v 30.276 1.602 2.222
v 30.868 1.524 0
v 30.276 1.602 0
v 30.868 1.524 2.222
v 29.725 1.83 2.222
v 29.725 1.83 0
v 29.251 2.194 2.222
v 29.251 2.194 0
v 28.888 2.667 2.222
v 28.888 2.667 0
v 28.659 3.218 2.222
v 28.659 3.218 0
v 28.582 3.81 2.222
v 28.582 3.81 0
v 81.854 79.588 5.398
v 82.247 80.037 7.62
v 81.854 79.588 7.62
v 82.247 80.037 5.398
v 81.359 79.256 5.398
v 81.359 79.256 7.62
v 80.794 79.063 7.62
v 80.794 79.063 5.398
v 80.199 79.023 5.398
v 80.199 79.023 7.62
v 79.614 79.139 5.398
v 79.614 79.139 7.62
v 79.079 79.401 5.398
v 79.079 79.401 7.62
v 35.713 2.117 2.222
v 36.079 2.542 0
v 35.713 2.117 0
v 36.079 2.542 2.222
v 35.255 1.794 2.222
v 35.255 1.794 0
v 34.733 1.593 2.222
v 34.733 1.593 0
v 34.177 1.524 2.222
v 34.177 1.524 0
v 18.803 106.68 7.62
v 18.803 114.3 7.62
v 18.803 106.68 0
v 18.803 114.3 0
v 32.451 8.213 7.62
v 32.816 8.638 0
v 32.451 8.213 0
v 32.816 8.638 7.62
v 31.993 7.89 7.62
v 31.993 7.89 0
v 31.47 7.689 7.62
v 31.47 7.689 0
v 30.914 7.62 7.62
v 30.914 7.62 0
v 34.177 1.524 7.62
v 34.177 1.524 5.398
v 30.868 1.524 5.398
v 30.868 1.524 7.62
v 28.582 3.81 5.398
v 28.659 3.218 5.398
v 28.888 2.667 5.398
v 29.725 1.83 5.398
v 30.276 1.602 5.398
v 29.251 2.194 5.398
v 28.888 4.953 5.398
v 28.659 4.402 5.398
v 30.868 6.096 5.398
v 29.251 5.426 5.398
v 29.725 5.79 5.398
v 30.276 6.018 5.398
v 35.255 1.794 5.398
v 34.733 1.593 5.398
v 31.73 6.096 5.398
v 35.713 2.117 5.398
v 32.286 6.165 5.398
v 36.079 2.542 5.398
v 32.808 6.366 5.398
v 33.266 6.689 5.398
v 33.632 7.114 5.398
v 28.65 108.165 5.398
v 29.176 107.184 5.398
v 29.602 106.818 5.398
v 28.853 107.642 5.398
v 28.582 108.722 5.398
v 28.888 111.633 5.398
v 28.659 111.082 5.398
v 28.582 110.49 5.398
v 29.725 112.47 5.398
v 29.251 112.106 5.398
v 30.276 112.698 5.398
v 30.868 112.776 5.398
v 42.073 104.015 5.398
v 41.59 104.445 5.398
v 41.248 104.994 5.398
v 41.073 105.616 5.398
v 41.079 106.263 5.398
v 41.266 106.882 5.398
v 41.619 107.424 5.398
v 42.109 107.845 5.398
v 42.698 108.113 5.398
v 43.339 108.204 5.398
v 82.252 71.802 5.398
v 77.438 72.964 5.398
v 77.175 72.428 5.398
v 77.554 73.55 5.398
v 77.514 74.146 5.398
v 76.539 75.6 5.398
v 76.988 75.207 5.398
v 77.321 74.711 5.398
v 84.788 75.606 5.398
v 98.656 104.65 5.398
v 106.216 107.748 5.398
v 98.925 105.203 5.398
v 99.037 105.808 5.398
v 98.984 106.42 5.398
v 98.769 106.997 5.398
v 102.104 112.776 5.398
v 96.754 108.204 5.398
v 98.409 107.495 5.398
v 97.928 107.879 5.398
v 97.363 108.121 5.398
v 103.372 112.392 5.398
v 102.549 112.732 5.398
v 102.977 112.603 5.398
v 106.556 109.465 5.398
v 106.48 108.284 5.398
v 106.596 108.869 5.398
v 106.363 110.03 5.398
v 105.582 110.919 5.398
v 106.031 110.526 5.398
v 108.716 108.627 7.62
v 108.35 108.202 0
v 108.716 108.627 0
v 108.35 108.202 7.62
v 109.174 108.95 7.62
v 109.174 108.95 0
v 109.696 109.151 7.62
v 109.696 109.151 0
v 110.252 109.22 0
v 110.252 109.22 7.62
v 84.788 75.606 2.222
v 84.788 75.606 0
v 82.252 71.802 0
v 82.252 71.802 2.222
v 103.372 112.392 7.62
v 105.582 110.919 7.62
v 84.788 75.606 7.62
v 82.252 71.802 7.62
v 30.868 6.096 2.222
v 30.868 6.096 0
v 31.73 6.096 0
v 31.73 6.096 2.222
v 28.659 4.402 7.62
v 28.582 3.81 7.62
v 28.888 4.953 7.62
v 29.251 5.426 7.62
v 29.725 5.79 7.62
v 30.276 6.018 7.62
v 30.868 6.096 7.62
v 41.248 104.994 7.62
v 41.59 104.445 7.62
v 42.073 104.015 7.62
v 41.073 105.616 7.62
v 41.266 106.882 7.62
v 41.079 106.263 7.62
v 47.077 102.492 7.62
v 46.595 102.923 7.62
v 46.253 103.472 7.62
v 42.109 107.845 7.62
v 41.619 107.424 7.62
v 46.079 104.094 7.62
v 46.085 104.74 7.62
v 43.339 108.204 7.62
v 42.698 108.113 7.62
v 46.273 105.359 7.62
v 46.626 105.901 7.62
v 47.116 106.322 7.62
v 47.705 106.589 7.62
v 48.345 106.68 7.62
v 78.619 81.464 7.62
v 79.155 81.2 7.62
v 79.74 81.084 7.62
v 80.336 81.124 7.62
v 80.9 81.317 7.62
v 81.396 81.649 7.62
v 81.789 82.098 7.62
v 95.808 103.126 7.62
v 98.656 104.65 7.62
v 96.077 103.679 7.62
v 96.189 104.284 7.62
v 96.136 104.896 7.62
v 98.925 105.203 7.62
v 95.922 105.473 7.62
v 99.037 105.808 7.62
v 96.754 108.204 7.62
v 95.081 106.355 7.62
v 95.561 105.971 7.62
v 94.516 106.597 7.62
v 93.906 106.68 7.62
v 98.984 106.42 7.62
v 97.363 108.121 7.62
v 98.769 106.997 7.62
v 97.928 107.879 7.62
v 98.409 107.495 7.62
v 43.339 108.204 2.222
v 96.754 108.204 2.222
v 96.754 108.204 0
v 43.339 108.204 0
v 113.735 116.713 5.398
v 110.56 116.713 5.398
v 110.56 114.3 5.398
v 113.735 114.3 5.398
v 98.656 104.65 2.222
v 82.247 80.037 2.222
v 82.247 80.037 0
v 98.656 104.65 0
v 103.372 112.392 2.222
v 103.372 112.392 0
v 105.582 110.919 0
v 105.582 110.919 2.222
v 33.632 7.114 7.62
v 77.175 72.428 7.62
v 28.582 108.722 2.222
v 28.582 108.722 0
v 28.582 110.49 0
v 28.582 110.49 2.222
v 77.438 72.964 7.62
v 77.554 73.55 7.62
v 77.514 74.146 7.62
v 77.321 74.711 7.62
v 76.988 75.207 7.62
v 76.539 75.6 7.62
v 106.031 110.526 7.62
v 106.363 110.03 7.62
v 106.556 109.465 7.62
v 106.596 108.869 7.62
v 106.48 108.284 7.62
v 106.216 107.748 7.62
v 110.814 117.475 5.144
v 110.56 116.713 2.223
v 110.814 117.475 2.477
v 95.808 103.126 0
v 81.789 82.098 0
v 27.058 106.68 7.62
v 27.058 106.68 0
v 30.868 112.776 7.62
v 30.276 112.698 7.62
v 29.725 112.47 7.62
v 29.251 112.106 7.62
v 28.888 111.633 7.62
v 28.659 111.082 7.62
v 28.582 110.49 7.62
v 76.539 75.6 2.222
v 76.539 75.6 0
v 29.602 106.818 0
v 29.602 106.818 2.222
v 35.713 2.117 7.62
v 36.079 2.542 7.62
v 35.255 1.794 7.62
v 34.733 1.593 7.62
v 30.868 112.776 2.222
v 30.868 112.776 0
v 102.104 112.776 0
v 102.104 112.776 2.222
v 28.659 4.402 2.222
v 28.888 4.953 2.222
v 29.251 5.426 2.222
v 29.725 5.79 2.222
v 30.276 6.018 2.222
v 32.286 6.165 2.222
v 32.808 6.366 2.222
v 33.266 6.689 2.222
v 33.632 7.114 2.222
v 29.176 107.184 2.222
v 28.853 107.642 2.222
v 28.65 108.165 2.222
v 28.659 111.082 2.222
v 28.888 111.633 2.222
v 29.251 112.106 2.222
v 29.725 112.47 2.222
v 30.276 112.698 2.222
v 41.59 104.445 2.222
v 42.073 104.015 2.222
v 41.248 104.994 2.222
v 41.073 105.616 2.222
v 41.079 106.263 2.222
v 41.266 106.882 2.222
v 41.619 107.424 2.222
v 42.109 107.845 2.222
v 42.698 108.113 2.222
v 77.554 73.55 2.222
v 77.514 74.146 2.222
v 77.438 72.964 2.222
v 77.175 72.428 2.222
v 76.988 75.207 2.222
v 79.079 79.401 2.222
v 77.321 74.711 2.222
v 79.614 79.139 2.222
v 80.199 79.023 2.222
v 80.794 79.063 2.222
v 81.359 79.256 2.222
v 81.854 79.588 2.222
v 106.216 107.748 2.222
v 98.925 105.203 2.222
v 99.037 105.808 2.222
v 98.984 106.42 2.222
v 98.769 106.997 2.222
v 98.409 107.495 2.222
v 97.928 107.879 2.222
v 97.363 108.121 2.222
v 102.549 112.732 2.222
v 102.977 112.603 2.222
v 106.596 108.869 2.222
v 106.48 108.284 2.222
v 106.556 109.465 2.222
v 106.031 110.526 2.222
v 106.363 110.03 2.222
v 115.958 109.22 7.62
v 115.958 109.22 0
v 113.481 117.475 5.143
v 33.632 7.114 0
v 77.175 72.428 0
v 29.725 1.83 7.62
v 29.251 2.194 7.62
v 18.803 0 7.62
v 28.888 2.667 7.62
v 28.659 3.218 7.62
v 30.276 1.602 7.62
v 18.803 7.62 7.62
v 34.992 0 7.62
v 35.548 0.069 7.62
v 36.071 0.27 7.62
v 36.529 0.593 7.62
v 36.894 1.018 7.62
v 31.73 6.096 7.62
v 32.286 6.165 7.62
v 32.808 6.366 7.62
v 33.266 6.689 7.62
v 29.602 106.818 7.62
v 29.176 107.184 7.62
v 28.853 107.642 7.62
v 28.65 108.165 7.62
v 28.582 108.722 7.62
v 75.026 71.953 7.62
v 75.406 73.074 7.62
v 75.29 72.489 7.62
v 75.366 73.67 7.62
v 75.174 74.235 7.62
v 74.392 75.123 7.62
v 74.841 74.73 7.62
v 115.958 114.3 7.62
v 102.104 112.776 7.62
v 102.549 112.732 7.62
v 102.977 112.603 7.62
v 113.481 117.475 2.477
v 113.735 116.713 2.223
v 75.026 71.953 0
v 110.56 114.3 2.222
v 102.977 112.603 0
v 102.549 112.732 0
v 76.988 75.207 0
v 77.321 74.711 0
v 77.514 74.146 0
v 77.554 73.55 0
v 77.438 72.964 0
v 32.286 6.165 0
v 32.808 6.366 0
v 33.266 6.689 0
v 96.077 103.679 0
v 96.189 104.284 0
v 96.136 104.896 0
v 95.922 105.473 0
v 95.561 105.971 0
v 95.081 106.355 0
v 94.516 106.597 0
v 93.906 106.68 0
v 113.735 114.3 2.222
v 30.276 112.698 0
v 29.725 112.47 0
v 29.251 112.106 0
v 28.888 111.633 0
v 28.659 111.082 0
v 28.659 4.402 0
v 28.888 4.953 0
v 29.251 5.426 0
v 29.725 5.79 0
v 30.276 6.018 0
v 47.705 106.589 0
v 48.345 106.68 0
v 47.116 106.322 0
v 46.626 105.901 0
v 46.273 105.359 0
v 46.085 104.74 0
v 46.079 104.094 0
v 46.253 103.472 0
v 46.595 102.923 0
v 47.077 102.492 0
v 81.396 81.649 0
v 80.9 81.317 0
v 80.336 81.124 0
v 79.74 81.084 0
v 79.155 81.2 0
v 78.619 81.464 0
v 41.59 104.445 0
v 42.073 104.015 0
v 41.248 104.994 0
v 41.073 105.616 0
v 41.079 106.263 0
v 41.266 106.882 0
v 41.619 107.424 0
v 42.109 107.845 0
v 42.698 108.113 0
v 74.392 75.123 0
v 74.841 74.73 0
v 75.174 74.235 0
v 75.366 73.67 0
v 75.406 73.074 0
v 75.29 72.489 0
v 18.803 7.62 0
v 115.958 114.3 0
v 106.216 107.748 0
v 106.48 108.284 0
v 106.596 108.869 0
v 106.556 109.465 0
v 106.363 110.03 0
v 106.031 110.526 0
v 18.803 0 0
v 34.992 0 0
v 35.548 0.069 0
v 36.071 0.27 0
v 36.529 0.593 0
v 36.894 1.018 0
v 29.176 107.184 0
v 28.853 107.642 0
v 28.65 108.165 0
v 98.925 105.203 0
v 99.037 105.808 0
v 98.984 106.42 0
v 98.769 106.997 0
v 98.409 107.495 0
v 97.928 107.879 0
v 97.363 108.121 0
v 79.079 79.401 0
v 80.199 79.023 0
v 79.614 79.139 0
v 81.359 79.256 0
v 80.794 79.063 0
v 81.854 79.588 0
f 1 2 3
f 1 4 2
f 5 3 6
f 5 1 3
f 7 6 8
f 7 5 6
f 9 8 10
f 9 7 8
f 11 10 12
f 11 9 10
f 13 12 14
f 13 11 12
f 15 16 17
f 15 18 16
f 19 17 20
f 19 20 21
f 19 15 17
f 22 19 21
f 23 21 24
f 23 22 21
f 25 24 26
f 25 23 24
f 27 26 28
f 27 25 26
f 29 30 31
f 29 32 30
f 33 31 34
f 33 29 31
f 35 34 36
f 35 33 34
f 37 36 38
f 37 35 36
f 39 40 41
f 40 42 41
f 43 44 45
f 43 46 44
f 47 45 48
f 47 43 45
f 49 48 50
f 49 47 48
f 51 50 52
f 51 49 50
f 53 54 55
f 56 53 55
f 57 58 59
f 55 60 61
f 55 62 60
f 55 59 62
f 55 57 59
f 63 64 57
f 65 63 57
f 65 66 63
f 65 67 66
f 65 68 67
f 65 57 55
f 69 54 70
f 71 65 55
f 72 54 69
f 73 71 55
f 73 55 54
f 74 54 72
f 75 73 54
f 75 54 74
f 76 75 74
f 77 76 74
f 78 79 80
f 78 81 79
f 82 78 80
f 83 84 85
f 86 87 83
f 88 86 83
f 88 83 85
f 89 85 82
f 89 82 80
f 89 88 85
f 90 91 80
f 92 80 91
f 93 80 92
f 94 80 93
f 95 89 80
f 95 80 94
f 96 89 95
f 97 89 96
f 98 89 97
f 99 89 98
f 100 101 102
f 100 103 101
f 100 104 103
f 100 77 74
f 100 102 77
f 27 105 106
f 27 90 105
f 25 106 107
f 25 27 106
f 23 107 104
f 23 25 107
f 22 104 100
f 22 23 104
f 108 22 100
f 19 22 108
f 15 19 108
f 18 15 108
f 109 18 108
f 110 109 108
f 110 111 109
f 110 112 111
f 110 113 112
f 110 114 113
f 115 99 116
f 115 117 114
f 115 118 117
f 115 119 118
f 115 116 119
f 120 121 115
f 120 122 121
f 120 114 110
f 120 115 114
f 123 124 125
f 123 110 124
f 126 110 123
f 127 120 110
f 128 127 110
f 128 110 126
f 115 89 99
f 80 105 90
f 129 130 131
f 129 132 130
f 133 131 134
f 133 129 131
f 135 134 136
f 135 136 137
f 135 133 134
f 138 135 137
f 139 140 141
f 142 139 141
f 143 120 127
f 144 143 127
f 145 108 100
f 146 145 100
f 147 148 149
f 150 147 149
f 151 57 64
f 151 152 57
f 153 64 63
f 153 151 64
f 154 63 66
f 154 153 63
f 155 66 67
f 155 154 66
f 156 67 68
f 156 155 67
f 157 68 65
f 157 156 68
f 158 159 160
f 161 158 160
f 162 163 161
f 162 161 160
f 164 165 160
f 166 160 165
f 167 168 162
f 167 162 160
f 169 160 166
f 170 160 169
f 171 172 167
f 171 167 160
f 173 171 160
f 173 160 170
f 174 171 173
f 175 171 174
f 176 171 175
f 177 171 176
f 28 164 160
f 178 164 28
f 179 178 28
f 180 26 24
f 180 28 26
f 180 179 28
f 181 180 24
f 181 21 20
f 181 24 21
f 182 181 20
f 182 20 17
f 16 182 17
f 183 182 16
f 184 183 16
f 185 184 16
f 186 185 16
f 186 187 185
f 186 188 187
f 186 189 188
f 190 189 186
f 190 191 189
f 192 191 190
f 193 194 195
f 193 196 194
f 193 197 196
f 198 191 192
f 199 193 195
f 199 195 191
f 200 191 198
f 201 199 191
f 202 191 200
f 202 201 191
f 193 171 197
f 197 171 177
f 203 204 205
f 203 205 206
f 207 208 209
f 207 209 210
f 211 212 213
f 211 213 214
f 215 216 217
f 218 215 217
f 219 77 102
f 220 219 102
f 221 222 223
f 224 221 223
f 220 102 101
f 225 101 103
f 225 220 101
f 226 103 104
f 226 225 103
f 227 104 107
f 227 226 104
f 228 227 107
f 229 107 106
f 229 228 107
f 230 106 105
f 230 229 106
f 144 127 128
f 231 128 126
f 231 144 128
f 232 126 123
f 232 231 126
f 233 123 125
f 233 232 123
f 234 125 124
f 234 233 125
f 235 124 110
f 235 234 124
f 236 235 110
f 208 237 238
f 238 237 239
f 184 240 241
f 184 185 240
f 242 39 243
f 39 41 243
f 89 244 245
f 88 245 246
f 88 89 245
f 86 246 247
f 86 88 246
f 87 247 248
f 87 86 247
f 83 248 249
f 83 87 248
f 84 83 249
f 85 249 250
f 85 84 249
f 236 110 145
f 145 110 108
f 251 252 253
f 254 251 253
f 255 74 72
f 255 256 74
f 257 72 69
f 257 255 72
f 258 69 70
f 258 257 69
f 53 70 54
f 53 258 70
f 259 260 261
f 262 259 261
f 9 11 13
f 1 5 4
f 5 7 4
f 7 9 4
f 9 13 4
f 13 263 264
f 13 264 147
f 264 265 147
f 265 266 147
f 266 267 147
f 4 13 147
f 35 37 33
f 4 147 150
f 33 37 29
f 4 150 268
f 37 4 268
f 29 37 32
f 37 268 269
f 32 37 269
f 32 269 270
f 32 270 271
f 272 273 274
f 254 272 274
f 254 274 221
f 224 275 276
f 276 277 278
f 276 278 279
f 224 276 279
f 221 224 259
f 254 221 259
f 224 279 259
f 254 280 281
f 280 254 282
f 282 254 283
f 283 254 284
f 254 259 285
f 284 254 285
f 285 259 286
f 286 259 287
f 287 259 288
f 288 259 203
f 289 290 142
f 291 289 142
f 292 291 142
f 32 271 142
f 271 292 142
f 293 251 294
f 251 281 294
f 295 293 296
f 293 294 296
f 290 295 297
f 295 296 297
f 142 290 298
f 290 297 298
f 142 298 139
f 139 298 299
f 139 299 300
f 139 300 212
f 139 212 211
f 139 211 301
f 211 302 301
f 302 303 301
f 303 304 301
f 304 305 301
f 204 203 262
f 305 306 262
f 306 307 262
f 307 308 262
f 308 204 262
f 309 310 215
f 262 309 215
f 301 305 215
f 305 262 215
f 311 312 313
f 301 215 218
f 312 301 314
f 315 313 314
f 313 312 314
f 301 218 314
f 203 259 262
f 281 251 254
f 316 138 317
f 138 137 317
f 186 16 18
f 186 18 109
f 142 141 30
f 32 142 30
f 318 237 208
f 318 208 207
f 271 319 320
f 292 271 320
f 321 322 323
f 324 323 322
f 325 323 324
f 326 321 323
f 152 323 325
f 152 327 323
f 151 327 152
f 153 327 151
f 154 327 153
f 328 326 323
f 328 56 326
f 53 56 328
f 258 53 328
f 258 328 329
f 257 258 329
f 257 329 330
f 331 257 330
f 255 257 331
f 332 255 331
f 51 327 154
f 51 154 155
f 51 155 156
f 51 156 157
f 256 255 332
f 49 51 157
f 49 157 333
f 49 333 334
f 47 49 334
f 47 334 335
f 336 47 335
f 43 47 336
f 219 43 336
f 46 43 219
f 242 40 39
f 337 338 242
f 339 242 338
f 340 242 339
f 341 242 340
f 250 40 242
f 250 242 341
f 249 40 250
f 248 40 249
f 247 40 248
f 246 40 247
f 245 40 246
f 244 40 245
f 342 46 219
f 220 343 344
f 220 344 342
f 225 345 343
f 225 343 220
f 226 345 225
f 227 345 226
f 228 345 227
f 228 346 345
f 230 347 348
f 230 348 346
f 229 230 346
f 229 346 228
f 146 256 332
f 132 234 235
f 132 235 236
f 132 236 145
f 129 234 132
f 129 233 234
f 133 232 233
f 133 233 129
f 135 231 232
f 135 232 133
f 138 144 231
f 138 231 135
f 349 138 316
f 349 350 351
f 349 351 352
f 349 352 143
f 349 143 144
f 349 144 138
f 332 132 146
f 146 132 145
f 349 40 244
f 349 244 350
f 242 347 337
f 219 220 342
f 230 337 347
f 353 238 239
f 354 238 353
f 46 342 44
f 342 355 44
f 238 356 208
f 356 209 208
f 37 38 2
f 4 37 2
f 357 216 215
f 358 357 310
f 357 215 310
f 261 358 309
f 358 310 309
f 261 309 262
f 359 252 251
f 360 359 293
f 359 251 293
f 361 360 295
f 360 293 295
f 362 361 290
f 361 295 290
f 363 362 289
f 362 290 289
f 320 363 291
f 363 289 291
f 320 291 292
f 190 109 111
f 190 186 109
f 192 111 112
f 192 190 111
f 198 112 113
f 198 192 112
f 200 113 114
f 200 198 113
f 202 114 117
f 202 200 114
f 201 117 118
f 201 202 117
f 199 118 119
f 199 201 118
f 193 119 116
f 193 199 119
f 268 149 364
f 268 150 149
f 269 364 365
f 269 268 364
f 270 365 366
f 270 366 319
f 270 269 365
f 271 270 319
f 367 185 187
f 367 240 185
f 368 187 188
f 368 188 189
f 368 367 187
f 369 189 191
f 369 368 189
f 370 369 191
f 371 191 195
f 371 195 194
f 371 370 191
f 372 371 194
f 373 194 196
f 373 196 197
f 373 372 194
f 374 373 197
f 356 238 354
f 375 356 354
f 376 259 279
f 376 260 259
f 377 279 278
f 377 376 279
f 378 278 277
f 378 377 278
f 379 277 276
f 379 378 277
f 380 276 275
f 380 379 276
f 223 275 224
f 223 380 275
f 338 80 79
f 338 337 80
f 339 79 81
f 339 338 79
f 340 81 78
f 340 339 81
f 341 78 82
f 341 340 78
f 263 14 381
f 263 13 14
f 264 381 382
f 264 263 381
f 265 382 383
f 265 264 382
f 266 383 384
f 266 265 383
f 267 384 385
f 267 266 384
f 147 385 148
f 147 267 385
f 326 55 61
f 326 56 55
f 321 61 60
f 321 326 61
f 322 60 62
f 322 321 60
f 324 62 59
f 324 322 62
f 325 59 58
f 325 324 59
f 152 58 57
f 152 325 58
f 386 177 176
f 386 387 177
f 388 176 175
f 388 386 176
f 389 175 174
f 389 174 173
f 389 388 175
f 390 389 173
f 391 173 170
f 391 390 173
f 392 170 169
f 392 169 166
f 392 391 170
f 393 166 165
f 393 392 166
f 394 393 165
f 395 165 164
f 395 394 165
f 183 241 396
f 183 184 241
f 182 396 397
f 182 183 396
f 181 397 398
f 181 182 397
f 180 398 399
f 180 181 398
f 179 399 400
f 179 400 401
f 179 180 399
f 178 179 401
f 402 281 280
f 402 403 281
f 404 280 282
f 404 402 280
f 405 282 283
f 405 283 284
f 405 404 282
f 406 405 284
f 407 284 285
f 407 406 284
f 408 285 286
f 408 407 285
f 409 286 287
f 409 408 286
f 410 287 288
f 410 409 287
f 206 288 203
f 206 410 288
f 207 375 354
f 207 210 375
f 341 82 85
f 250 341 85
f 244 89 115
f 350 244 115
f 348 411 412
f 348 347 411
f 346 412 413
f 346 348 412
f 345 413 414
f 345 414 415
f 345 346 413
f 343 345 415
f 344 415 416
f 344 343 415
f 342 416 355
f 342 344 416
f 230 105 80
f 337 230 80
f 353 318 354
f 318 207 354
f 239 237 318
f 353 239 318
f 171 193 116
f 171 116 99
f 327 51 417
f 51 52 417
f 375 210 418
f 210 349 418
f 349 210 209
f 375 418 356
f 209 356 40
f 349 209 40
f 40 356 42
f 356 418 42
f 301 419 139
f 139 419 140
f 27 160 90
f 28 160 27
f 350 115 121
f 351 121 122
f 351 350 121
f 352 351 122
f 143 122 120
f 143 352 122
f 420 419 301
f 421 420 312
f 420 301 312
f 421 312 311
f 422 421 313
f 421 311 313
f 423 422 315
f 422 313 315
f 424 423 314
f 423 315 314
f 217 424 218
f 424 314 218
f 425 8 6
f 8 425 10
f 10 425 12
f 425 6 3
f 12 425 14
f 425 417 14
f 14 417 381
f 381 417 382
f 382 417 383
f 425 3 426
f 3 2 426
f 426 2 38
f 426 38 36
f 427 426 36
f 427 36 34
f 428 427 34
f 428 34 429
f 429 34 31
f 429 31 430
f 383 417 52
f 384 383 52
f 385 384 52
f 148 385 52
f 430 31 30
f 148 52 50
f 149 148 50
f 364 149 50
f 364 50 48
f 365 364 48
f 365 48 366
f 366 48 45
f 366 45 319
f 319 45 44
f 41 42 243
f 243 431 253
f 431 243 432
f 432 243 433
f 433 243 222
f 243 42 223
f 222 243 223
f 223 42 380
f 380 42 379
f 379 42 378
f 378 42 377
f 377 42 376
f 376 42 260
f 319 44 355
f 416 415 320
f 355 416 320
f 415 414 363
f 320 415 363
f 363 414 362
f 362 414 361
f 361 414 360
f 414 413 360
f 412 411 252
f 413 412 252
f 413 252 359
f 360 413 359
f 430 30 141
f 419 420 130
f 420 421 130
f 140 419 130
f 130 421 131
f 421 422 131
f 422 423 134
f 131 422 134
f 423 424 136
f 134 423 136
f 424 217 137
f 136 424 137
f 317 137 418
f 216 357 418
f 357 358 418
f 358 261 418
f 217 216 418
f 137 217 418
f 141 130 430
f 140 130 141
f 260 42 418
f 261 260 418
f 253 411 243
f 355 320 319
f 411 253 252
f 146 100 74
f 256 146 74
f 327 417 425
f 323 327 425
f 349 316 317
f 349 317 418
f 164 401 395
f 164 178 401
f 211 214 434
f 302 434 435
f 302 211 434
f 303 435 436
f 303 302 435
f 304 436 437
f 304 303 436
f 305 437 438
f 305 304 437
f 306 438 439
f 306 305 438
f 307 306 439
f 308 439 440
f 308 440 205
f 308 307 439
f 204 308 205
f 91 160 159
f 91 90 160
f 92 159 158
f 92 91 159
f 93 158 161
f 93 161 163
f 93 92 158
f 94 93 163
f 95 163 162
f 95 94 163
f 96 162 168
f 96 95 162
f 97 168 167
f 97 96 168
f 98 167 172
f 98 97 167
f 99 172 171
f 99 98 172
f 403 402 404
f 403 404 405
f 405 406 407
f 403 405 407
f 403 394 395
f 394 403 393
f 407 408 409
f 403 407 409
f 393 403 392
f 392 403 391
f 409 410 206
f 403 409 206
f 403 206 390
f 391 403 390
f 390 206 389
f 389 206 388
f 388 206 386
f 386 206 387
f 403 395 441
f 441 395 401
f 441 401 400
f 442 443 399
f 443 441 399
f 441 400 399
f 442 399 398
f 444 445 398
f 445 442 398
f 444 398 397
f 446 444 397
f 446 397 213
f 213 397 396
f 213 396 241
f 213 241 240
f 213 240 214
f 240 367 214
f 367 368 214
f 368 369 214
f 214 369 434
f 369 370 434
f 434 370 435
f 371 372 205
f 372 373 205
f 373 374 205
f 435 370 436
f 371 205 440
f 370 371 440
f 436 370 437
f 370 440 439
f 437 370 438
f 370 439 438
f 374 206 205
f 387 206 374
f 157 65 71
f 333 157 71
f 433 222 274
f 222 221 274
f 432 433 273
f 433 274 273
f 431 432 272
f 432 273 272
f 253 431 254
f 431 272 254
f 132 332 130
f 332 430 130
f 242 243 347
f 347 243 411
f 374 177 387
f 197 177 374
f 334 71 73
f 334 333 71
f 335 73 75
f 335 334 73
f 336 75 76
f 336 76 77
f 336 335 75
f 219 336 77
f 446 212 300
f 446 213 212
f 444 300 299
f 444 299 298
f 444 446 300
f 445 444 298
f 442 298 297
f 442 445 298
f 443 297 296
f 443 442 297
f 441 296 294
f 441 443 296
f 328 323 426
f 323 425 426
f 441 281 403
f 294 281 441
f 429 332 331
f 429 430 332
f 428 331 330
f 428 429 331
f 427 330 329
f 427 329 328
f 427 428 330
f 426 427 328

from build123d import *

# Parameters (mm, degrees)
F1_DEPTH    = 1.5875
F0_W        = 3.175
F0_H        = 3.81
F2_DEPTH    = 3.81
F0_H_2      = 3.175
F3_DEPTH    = 1.5875
F5_R        = 2.28599
F6_C1_SIZE2 = 0.254
F6_C1_SIZE  = 0.762
F6_C2_SIZE2 = 0.254
F6_C2_SIZE  = 0.762
F6_C3_SIZE2 = 0.762
F6_C3_SIZE  = 0.254
F6_C4_SIZE2 = 0.762
F6_C4_SIZE  = 0.254


# Not quite as in the source:
# - a fillet or chamfer is up to 0.001 mm smaller than in the source, because OpenCascade refuses the exact size


with BuildPart() as f1:
    # F0 (on Top) → F1 (new body, symmetric)
    with BuildSketch(Plane.XY):
        Polygon((84.7879795397, 75.6059451024), (107.4843514416, 109.6505029552), (102.7961058745, 112.776), (28.5815359464, 112.776), (28.5815359464, 107.4966776252), (78.4441827097, 74.332540073), (32.9531559943, 6.096), (28.5815359464, 6.096), (28.5815359464, 1.524), (35.4000161381, 1.524), (82.2518902426, 71.8018111567), align=None)
        Polygon((35.7737204145, 108.204), (101.0251559943, 108.204), (80.9802734819, 78.1366762315), align=None, mode=Mode.SUBTRACT)
    extrude(amount=F1_DEPTH, both=True)

    # F0 (on Top) → F2 (join, symmetric)
    with BuildSketch(Plane.XY):
        Polygon((27.0575359464, 3.81), (27.0575359464, 0), (36.215636186, 0), (109.0289695194, 109.22), (115.9575359464, 109.22), (115.9575359464, 114.3), (113.7350359464, 114.3), (110.5600359464, 114.3), (103.2575359464, 114.3), (27.0575359464, 114.3), (18.8025359464, 114.3), (18.8025359464, 106.68), (23.8825359464, 106.68), (23.8825359464, 110.49), (27.0575359464, 110.49), (27.0575359464, 106.68), (76.2944590233, 73.8553846154), (32.1375359464, 7.62), (27.0575359464, 7.62), (18.8025359464, 7.62), (18.8025359464, 0), (23.8825359464, 0), (23.8825359464, 3.81), align=None)
        Polygon((102.7961058745, 112.776), (107.4843514416, 109.6505029552), (84.7879795397, 75.6059451024), (82.2518902426, 71.8018111567), (35.4000161381, 1.524), (28.5815359464, 1.524), (28.5815359464, 6.096), (32.9531559943, 6.096), (78.4441827097, 74.332540073), (28.5815359464, 107.4966776252), (28.5815359464, 112.776), align=None, mode=Mode.SUBTRACT)
        Polygon((80.9802734819, 78.1366762315), (101.0251559943, 108.204), (35.7737204145, 108.204), align=None)
        Polygon((80.5212745185, 80.1956078582), (40.7946863059, 106.68), (98.1775359464, 106.68), align=None, mode=Mode.SUBTRACT)
        with Locations((25.4700359464, 1.905)):
            Rectangle(F0_W, F0_H)
        with Locations((25.4700359464, 108.585)):
            Rectangle(F0_W, F0_H)
    extrude(amount=F2_DEPTH, both=True)

    # F0 (on Top) → F3 (join, symmetric)
    with BuildSketch(Plane.XY):
        with Locations((112.1475359464, 115.8875)):
            Rectangle(F0_W, F0_H_2)
    extrude(amount=F3_DEPTH, both=True)


with BuildPart() as f1_1:
    # F4: moved
    add(f1.part.moved(Location((0, 0, 3.81))))

    # F5 (radius 2.286 in the source; OpenCascade refuses exactly that, so slightly less here)
    f5_edges = [f1_1.edges().sort_by_distance(p)[0] for p in [
        (35.77372, 108.204, 6.50875),
        (35.77372, 108.204, 1.11125),
        (101.025156, 108.204, 6.50875),
        (101.025156, 108.204, 1.11125),
        (80.980273, 78.136676, 1.11125),
        (80.980273, 78.136676, 6.50875),
        (78.444183, 74.33254, 6.50875),
        (78.444183, 74.33254, 1.11125),
        (102.796106, 112.776, 6.50875),
        (102.796106, 112.776, 1.11125),
        (28.581536, 112.776, 6.50875),
        (28.581536, 107.496678, 6.50875),
        (28.581536, 107.496678, 1.11125),
        (28.581536, 112.776, 1.11125),
        (32.953156, 6.096, 6.50875),
        (32.953156, 6.096, 1.11125),
        (35.400016, 1.524, 1.11125),
        (35.400016, 1.524, 6.50875),
        (28.581536, 6.096, 6.50875),
        (28.581536, 1.524, 6.50875),
        (28.581536, 1.524, 1.11125),
        (28.581536, 6.096, 1.11125),
        (107.484351, 109.650503, 6.50875),
        (107.484351, 109.650503, 1.11125),
        (109.02897, 109.22, 3.81),
        (36.215636, 0, 3.81),
        (76.294459, 73.855385, 3.81),
        (32.137536, 7.62, 3.81),
        (40.794686, 106.68, 3.81),
        (80.521275, 80.195608, 3.81),
        (98.177536, 106.68, 3.81),
    ]]
    fillet(f5_edges, radius=F5_R)

    # F6: chamfer of 0.254 x 0.762 on 4 edges, made by hand

    # F6_c1
    f6_c1_edges = [f1_1.edges().sort_by_distance(p)[0] for p in [
        (110.5600359464, 117.475, 3.81),
    ]]
    f6_c1_side = f1_1.faces().sort_by_distance((110.5600359464, 117.46992, 3.81))[0]
    chamfer(f6_c1_edges, length=F6_C1_SIZE, length2=F6_C1_SIZE2, reference=f6_c1_side)

    # F6_c2
    f6_c2_edges = [f1_1.edges().sort_by_distance(p)[0] for p in [
        (112.2745359464, 117.475, 5.3975),
    ]]
    f6_c2_side = f1_1.faces().sort_by_distance((112.2745359464, 117.46992, 5.3975))[0]
    chamfer(f6_c2_edges, length=F6_C2_SIZE, length2=F6_C2_SIZE2, reference=f6_c2_side)

    # F6_c3
    f6_c3_edges = [f1_1.edges().sort_by_distance(p)[0] for p in [
        (113.7350359464, 117.475, 3.683),
    ]]
    f6_c3_side = f1_1.faces().sort_by_distance((113.7299559464, 117.475, 3.683))[0]
    chamfer(f6_c3_edges, length=F6_C3_SIZE, length2=F6_C3_SIZE2, reference=f6_c3_side)

    # F6_c4
    f6_c4_edges = [f1_1.edges().sort_by_distance(p)[0] for p in [
        (112.1475359464, 117.475, 2.2225),
    ]]
    f6_c4_side = f1_1.faces().sort_by_distance((112.1475359464, 117.475, 2.22758))[0]
    chamfer(f6_c4_edges, length=F6_C4_SIZE, length2=F6_C4_SIZE2, reference=f6_c4_side)


solid = f1_1.part
